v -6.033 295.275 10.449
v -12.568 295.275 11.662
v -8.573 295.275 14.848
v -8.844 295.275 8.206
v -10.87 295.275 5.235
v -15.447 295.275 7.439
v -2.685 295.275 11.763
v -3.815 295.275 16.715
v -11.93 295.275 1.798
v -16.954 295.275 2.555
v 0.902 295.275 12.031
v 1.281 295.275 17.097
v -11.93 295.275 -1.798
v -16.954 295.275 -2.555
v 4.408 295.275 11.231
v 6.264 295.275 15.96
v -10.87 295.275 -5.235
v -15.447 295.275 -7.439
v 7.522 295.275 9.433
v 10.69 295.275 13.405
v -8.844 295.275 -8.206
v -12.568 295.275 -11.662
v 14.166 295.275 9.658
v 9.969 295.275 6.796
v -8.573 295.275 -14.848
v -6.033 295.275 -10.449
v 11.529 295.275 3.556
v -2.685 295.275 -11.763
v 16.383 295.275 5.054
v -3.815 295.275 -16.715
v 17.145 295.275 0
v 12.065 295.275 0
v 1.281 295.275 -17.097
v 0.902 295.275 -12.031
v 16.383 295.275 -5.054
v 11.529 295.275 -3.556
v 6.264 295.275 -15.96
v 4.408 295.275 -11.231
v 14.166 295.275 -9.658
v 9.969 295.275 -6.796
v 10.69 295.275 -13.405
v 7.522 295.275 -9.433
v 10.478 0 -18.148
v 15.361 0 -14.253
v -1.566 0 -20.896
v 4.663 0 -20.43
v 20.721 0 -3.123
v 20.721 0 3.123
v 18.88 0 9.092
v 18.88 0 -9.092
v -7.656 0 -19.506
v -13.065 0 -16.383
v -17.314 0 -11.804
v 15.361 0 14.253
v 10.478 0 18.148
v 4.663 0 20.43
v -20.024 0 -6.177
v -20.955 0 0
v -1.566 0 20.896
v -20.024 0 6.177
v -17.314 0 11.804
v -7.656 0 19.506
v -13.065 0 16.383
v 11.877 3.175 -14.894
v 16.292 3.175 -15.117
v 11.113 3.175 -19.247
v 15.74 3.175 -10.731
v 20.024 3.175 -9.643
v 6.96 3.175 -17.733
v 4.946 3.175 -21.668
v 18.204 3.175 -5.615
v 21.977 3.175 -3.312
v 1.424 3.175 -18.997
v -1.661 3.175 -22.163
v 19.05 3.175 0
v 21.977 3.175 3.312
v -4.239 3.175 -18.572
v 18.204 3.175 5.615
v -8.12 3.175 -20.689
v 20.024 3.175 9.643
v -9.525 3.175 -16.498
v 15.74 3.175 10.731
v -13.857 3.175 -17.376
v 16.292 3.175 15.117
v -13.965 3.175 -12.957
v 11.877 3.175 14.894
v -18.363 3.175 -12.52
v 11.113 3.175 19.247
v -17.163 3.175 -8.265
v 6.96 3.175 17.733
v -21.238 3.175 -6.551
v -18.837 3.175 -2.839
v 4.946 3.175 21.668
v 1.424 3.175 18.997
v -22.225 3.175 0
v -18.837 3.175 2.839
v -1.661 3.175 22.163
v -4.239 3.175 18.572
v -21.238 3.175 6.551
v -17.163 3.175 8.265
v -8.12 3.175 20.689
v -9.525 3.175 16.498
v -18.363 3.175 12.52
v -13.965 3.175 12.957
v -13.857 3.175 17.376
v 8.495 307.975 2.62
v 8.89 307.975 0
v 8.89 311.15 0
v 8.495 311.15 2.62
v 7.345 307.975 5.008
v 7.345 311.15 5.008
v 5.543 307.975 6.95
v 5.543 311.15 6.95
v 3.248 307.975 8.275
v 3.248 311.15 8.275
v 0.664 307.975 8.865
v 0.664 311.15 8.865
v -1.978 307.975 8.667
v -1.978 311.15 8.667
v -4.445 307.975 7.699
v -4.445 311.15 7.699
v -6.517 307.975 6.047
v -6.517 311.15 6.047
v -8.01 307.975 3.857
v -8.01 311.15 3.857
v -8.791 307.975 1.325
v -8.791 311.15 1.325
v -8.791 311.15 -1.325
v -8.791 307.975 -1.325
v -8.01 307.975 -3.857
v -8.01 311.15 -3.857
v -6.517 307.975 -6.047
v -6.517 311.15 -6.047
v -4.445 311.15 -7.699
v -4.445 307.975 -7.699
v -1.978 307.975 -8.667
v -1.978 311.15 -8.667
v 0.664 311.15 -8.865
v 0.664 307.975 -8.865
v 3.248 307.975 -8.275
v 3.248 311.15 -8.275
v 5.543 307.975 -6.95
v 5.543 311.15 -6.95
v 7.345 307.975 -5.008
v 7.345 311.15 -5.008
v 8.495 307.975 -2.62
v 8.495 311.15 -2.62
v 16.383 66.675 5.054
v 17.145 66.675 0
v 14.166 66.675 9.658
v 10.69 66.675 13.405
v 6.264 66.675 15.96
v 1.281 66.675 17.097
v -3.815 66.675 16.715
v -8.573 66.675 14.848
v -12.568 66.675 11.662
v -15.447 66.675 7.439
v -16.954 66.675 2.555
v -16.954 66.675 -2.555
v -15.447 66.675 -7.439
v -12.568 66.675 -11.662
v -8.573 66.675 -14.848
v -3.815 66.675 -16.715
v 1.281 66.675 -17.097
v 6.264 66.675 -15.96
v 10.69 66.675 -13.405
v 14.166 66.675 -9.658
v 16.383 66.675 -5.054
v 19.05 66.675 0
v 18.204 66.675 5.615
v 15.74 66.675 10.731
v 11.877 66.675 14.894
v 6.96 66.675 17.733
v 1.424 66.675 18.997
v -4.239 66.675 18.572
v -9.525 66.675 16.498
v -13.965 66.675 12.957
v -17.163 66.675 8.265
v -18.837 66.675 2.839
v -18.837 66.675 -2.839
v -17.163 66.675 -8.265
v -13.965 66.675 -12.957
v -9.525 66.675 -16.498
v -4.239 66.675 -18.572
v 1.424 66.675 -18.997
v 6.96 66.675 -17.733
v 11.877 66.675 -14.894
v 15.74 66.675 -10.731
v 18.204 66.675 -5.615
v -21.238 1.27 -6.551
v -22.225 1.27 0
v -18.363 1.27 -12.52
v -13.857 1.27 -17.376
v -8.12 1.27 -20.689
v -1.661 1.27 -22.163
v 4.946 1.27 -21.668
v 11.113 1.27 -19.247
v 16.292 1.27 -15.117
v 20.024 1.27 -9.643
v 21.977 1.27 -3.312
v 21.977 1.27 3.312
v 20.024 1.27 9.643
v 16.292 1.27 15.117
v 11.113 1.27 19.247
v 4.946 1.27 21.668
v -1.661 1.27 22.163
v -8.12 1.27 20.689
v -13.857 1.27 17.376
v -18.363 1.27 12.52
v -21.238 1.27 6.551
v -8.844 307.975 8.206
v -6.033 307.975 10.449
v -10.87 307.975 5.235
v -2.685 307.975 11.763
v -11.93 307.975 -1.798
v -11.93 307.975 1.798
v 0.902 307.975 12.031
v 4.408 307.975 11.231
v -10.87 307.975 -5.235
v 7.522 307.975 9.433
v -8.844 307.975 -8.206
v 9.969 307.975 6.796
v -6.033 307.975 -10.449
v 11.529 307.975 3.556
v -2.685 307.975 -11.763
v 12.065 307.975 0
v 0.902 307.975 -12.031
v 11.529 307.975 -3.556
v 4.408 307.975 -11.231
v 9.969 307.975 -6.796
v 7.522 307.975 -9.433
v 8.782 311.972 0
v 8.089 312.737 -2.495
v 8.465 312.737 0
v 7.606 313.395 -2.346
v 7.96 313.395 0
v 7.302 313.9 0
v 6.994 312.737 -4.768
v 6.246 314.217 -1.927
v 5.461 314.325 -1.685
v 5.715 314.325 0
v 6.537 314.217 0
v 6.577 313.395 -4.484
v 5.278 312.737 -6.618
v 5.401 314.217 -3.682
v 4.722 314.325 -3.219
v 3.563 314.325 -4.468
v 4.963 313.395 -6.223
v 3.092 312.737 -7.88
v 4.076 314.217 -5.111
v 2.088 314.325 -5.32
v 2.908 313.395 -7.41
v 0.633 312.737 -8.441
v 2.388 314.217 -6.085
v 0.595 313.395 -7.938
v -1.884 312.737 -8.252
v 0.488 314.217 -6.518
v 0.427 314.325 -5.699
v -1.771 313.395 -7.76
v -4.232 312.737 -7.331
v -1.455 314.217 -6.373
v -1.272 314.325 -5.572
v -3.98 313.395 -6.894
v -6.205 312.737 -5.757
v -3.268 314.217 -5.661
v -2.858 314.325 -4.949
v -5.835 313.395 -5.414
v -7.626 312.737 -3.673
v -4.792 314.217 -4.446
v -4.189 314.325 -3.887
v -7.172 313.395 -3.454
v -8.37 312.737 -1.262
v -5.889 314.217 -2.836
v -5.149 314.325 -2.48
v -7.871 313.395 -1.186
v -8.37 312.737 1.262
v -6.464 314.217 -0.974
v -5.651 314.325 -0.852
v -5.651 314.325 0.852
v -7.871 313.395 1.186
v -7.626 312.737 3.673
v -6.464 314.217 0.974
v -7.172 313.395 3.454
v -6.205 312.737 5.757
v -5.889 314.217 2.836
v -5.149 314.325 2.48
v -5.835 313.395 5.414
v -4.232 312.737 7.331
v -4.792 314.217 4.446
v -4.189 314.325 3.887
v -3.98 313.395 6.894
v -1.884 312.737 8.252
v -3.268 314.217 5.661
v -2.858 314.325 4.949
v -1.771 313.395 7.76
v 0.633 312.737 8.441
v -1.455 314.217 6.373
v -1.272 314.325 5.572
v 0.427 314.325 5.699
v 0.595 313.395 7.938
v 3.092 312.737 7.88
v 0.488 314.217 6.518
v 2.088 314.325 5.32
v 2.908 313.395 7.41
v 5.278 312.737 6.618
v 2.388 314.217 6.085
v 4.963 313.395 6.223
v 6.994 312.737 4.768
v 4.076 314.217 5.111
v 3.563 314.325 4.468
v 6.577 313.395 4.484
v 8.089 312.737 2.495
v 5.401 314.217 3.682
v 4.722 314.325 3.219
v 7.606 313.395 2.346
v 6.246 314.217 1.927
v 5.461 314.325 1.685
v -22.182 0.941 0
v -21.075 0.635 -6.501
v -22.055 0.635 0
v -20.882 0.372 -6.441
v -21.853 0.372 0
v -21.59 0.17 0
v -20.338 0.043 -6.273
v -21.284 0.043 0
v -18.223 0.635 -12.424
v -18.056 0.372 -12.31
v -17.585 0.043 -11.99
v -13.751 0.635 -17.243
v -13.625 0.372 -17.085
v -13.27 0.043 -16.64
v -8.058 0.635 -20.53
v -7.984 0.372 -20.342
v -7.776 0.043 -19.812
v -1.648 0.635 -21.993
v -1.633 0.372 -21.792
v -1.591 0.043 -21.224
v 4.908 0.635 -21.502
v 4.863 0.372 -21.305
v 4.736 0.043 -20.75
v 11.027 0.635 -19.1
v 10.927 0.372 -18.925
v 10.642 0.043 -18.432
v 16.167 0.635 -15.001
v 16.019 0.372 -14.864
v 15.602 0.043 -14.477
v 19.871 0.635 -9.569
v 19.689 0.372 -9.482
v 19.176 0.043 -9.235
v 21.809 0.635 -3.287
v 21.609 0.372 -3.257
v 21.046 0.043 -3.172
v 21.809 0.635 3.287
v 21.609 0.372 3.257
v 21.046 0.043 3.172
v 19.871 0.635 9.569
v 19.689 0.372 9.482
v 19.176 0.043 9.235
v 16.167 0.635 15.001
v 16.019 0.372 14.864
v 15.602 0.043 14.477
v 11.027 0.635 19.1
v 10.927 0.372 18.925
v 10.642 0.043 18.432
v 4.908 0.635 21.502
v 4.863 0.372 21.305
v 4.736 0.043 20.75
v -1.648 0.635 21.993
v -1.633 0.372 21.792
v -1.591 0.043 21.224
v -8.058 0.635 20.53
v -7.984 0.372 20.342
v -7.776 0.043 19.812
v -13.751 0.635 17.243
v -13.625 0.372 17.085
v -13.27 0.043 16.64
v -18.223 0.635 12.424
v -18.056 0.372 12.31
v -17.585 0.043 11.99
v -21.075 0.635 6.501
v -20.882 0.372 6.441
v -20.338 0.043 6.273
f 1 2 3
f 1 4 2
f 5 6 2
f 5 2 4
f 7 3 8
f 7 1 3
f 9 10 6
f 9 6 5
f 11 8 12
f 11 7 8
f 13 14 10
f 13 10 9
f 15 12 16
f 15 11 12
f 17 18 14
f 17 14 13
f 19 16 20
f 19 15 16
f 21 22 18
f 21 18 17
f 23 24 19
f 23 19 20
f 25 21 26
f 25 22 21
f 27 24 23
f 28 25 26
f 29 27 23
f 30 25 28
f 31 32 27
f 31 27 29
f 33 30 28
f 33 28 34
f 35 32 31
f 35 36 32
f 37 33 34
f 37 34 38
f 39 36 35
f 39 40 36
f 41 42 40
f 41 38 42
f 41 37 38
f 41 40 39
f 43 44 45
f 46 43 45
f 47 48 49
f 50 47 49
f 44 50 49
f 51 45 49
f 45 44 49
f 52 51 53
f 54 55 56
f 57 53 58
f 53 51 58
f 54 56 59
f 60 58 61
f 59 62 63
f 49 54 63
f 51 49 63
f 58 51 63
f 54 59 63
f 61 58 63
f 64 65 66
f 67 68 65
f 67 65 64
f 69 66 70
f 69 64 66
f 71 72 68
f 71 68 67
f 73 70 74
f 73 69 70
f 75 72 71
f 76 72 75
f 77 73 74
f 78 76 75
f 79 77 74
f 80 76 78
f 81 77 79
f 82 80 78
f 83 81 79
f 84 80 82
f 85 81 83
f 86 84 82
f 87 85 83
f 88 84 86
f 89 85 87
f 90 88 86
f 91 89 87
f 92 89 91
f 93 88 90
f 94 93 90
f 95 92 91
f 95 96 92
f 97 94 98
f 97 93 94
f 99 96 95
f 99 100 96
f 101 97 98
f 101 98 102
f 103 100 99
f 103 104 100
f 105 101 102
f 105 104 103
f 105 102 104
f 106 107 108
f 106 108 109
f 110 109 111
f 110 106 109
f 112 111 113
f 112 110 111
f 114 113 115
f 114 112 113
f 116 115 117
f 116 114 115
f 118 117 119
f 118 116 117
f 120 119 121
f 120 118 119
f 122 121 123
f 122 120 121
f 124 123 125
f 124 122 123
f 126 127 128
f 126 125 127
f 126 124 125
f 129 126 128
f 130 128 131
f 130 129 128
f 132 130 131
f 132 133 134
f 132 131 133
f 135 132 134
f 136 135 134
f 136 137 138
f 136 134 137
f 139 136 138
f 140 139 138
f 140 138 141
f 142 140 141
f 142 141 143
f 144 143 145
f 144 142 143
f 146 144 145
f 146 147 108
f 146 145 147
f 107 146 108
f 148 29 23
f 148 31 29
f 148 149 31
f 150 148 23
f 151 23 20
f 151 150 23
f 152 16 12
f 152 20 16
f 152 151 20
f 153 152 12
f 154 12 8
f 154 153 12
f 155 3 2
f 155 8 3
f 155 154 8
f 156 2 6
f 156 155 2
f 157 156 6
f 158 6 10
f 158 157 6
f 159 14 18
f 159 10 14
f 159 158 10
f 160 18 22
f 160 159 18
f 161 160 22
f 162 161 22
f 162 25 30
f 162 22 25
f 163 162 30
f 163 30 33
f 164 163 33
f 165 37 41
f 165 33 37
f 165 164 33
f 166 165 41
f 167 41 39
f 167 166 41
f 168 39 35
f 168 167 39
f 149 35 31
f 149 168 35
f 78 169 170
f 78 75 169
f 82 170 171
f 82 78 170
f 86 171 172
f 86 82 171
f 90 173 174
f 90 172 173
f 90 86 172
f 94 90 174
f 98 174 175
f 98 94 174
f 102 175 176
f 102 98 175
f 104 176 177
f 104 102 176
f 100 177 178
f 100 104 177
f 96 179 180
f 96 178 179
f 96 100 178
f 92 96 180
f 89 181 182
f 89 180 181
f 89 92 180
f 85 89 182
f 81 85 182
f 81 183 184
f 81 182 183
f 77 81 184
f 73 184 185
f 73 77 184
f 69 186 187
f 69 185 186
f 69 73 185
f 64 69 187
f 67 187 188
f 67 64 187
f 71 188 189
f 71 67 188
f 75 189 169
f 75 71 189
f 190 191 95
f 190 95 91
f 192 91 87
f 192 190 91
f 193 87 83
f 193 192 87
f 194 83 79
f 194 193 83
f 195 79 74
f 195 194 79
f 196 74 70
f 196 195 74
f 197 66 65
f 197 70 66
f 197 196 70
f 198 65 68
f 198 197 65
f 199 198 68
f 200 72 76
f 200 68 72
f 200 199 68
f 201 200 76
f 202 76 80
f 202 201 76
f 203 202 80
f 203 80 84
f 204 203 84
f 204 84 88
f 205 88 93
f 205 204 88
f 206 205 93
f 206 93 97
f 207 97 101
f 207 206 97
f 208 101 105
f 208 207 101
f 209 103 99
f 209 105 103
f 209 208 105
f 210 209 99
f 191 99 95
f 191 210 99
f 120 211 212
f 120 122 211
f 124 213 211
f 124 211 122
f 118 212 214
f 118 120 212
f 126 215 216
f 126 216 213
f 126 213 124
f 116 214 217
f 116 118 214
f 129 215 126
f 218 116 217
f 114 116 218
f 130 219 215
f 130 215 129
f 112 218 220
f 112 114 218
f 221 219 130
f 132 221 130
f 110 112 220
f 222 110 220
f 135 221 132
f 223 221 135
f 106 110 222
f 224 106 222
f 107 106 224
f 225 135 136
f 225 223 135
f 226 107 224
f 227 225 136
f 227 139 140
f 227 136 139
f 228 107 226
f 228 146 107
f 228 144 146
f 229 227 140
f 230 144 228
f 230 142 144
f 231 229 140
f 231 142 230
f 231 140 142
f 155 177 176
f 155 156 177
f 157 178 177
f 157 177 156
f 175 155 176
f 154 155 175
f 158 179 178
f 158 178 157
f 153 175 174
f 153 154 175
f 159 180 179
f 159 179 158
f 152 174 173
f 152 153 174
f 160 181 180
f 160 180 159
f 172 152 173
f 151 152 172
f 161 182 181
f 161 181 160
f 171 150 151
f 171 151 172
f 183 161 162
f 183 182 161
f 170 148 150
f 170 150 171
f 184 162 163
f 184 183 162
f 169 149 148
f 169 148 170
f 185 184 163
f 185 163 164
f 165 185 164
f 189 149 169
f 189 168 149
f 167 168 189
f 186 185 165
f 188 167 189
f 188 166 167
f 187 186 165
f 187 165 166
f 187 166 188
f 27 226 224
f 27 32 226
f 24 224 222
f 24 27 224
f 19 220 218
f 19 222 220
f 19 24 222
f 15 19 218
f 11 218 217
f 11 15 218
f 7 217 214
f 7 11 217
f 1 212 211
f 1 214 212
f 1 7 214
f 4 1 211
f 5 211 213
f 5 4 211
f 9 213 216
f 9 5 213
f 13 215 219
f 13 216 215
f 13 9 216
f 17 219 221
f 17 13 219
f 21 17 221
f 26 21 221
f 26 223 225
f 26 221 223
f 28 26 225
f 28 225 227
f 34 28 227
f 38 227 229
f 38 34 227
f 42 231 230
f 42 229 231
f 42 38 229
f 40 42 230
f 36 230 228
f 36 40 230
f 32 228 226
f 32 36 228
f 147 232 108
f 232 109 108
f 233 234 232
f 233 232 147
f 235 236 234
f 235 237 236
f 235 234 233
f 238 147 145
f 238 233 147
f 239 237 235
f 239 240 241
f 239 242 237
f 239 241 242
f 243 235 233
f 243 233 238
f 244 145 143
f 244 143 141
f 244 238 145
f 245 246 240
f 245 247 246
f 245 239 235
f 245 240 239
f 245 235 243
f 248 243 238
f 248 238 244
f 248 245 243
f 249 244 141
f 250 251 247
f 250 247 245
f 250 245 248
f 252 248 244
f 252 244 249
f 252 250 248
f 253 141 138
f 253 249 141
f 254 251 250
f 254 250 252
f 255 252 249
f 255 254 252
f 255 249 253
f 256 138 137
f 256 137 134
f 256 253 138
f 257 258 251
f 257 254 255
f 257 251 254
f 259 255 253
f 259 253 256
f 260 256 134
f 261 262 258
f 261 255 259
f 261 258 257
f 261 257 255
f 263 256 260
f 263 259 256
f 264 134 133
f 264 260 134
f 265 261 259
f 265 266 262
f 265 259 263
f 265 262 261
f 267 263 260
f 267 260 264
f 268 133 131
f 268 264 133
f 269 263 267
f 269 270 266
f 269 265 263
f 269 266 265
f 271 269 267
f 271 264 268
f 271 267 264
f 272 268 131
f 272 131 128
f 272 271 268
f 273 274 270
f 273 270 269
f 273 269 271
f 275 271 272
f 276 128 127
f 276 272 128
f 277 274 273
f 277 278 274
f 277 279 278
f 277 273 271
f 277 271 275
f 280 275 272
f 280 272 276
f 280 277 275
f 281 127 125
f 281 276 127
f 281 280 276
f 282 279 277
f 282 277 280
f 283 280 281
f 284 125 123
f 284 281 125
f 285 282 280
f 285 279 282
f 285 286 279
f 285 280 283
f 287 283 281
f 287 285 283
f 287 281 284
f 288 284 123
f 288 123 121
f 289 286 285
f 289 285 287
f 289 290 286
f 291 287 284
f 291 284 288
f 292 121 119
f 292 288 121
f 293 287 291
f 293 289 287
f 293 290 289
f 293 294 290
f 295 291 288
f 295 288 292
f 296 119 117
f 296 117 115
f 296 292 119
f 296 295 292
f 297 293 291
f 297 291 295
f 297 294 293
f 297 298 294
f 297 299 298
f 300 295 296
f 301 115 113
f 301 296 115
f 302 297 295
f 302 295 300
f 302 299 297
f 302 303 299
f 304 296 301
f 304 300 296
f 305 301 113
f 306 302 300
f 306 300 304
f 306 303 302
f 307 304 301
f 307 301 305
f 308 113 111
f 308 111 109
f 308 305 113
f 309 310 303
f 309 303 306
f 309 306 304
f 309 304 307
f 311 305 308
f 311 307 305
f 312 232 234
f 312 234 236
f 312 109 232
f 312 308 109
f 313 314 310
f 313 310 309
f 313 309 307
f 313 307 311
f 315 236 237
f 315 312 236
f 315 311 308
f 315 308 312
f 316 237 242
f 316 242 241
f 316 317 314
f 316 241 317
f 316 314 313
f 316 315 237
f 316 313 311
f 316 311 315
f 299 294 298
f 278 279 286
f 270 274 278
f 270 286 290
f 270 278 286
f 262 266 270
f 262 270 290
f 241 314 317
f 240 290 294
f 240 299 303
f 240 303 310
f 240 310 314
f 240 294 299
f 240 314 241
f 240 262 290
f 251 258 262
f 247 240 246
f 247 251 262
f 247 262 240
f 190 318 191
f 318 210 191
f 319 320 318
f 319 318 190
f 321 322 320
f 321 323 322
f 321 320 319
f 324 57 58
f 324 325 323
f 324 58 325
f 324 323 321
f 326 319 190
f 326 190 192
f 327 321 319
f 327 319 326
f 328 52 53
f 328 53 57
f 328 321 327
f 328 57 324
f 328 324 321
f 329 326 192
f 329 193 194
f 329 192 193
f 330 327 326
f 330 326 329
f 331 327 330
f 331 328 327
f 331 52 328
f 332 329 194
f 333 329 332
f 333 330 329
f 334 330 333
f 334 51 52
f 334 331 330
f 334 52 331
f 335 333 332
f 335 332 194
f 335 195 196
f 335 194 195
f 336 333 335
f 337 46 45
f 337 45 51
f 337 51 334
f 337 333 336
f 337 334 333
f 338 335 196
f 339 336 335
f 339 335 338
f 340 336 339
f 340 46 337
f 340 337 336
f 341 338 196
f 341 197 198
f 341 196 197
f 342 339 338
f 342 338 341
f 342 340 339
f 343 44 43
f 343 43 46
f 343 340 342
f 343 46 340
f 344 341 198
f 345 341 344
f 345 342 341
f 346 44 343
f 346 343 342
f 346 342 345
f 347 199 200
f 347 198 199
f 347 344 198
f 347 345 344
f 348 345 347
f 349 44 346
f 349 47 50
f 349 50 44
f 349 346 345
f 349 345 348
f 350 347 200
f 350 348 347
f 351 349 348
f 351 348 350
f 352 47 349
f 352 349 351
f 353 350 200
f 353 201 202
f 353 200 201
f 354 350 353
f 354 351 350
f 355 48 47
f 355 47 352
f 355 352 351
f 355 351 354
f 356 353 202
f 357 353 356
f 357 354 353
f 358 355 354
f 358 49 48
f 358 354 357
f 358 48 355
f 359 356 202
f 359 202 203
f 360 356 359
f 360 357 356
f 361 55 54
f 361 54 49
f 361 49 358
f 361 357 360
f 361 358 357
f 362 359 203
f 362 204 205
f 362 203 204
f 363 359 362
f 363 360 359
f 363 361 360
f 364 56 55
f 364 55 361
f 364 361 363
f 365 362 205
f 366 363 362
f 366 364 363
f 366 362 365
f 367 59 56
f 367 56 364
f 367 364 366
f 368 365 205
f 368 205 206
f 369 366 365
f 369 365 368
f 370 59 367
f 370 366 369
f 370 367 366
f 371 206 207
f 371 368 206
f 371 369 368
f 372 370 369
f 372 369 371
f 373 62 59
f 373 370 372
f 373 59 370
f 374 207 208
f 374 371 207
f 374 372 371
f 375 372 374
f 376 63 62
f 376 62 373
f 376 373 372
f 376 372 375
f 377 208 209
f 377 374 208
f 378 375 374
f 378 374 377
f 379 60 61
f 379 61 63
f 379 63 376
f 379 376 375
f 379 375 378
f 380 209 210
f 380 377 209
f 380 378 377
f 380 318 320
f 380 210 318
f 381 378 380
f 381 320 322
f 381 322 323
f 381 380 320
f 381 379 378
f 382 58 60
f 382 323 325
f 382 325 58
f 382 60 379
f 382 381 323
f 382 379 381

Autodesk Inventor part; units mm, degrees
ref_plane "YZ Plane" through (0, 0, 0) normal (1, 0, 0) x (0, 1, 0)
ref_plane "XZ Plane" through (0, 0, 0) normal (0, 1, 0) x (-1, 0, 0)
ref_plane "XY Plane" through (0, 0, 0) normal (0, 0, 1) x (1, 0, 0)
sketch "Sketch1" plane through (0, 0, 0) normal (0, 1, 0) x (-1, 0, 0)
  circle A0 centre (0, 0) radius 22.225
  dimension "d0" = 44.45
extrude "Extrusion1" add sketch "Sketch1" along normal blind 3.175
fillet "Fillet1" radius 1.27 1 edges at (22.225, 0, 0)
sketch "Sketch2" plane through (0, 3.175, 0) normal (0, 1, 0) x (1, 0, 0)
  circle A0 centre (0, 0) radius 19.05
  dimension "d4" = 38.1
extrude "Extrusion2" add sketch "Sketch2" along normal blind 63.5
sketch "Sketch3" plane through (0, 66.675, 0) normal (0, 1, 0) x (1, 0, 0)
  circle A0 centre (0, 0) radius 17.145
  dimension "d7" = 34.29
extrude "Extrusion3" add sketch "Sketch3" along normal blind 228.6
sketch "Sketch4" plane through (0, 295.275, 0) normal (0, 1, 0) x (1, 0, 0)
  circle A0 centre (0, 0) radius 12.065
  dimension "d10" = 24.13
extrude "Extrusion4" add sketch "Sketch4" along normal blind 12.7
sketch "Sketch5" plane through (0, 307.975, 0) normal (0, 1, 0) x (1, 0, 0)
  circle A0 centre (0, 0) radius 8.89
  dimension "d14" = 17.78
extrude "Extrusion5" add sketch "Sketch5" along normal blind 6.35
fillet "Fillet3" radius 3.175 1 edges at (-8.89, 314.325, 0)
properties part number "middle shaft"
